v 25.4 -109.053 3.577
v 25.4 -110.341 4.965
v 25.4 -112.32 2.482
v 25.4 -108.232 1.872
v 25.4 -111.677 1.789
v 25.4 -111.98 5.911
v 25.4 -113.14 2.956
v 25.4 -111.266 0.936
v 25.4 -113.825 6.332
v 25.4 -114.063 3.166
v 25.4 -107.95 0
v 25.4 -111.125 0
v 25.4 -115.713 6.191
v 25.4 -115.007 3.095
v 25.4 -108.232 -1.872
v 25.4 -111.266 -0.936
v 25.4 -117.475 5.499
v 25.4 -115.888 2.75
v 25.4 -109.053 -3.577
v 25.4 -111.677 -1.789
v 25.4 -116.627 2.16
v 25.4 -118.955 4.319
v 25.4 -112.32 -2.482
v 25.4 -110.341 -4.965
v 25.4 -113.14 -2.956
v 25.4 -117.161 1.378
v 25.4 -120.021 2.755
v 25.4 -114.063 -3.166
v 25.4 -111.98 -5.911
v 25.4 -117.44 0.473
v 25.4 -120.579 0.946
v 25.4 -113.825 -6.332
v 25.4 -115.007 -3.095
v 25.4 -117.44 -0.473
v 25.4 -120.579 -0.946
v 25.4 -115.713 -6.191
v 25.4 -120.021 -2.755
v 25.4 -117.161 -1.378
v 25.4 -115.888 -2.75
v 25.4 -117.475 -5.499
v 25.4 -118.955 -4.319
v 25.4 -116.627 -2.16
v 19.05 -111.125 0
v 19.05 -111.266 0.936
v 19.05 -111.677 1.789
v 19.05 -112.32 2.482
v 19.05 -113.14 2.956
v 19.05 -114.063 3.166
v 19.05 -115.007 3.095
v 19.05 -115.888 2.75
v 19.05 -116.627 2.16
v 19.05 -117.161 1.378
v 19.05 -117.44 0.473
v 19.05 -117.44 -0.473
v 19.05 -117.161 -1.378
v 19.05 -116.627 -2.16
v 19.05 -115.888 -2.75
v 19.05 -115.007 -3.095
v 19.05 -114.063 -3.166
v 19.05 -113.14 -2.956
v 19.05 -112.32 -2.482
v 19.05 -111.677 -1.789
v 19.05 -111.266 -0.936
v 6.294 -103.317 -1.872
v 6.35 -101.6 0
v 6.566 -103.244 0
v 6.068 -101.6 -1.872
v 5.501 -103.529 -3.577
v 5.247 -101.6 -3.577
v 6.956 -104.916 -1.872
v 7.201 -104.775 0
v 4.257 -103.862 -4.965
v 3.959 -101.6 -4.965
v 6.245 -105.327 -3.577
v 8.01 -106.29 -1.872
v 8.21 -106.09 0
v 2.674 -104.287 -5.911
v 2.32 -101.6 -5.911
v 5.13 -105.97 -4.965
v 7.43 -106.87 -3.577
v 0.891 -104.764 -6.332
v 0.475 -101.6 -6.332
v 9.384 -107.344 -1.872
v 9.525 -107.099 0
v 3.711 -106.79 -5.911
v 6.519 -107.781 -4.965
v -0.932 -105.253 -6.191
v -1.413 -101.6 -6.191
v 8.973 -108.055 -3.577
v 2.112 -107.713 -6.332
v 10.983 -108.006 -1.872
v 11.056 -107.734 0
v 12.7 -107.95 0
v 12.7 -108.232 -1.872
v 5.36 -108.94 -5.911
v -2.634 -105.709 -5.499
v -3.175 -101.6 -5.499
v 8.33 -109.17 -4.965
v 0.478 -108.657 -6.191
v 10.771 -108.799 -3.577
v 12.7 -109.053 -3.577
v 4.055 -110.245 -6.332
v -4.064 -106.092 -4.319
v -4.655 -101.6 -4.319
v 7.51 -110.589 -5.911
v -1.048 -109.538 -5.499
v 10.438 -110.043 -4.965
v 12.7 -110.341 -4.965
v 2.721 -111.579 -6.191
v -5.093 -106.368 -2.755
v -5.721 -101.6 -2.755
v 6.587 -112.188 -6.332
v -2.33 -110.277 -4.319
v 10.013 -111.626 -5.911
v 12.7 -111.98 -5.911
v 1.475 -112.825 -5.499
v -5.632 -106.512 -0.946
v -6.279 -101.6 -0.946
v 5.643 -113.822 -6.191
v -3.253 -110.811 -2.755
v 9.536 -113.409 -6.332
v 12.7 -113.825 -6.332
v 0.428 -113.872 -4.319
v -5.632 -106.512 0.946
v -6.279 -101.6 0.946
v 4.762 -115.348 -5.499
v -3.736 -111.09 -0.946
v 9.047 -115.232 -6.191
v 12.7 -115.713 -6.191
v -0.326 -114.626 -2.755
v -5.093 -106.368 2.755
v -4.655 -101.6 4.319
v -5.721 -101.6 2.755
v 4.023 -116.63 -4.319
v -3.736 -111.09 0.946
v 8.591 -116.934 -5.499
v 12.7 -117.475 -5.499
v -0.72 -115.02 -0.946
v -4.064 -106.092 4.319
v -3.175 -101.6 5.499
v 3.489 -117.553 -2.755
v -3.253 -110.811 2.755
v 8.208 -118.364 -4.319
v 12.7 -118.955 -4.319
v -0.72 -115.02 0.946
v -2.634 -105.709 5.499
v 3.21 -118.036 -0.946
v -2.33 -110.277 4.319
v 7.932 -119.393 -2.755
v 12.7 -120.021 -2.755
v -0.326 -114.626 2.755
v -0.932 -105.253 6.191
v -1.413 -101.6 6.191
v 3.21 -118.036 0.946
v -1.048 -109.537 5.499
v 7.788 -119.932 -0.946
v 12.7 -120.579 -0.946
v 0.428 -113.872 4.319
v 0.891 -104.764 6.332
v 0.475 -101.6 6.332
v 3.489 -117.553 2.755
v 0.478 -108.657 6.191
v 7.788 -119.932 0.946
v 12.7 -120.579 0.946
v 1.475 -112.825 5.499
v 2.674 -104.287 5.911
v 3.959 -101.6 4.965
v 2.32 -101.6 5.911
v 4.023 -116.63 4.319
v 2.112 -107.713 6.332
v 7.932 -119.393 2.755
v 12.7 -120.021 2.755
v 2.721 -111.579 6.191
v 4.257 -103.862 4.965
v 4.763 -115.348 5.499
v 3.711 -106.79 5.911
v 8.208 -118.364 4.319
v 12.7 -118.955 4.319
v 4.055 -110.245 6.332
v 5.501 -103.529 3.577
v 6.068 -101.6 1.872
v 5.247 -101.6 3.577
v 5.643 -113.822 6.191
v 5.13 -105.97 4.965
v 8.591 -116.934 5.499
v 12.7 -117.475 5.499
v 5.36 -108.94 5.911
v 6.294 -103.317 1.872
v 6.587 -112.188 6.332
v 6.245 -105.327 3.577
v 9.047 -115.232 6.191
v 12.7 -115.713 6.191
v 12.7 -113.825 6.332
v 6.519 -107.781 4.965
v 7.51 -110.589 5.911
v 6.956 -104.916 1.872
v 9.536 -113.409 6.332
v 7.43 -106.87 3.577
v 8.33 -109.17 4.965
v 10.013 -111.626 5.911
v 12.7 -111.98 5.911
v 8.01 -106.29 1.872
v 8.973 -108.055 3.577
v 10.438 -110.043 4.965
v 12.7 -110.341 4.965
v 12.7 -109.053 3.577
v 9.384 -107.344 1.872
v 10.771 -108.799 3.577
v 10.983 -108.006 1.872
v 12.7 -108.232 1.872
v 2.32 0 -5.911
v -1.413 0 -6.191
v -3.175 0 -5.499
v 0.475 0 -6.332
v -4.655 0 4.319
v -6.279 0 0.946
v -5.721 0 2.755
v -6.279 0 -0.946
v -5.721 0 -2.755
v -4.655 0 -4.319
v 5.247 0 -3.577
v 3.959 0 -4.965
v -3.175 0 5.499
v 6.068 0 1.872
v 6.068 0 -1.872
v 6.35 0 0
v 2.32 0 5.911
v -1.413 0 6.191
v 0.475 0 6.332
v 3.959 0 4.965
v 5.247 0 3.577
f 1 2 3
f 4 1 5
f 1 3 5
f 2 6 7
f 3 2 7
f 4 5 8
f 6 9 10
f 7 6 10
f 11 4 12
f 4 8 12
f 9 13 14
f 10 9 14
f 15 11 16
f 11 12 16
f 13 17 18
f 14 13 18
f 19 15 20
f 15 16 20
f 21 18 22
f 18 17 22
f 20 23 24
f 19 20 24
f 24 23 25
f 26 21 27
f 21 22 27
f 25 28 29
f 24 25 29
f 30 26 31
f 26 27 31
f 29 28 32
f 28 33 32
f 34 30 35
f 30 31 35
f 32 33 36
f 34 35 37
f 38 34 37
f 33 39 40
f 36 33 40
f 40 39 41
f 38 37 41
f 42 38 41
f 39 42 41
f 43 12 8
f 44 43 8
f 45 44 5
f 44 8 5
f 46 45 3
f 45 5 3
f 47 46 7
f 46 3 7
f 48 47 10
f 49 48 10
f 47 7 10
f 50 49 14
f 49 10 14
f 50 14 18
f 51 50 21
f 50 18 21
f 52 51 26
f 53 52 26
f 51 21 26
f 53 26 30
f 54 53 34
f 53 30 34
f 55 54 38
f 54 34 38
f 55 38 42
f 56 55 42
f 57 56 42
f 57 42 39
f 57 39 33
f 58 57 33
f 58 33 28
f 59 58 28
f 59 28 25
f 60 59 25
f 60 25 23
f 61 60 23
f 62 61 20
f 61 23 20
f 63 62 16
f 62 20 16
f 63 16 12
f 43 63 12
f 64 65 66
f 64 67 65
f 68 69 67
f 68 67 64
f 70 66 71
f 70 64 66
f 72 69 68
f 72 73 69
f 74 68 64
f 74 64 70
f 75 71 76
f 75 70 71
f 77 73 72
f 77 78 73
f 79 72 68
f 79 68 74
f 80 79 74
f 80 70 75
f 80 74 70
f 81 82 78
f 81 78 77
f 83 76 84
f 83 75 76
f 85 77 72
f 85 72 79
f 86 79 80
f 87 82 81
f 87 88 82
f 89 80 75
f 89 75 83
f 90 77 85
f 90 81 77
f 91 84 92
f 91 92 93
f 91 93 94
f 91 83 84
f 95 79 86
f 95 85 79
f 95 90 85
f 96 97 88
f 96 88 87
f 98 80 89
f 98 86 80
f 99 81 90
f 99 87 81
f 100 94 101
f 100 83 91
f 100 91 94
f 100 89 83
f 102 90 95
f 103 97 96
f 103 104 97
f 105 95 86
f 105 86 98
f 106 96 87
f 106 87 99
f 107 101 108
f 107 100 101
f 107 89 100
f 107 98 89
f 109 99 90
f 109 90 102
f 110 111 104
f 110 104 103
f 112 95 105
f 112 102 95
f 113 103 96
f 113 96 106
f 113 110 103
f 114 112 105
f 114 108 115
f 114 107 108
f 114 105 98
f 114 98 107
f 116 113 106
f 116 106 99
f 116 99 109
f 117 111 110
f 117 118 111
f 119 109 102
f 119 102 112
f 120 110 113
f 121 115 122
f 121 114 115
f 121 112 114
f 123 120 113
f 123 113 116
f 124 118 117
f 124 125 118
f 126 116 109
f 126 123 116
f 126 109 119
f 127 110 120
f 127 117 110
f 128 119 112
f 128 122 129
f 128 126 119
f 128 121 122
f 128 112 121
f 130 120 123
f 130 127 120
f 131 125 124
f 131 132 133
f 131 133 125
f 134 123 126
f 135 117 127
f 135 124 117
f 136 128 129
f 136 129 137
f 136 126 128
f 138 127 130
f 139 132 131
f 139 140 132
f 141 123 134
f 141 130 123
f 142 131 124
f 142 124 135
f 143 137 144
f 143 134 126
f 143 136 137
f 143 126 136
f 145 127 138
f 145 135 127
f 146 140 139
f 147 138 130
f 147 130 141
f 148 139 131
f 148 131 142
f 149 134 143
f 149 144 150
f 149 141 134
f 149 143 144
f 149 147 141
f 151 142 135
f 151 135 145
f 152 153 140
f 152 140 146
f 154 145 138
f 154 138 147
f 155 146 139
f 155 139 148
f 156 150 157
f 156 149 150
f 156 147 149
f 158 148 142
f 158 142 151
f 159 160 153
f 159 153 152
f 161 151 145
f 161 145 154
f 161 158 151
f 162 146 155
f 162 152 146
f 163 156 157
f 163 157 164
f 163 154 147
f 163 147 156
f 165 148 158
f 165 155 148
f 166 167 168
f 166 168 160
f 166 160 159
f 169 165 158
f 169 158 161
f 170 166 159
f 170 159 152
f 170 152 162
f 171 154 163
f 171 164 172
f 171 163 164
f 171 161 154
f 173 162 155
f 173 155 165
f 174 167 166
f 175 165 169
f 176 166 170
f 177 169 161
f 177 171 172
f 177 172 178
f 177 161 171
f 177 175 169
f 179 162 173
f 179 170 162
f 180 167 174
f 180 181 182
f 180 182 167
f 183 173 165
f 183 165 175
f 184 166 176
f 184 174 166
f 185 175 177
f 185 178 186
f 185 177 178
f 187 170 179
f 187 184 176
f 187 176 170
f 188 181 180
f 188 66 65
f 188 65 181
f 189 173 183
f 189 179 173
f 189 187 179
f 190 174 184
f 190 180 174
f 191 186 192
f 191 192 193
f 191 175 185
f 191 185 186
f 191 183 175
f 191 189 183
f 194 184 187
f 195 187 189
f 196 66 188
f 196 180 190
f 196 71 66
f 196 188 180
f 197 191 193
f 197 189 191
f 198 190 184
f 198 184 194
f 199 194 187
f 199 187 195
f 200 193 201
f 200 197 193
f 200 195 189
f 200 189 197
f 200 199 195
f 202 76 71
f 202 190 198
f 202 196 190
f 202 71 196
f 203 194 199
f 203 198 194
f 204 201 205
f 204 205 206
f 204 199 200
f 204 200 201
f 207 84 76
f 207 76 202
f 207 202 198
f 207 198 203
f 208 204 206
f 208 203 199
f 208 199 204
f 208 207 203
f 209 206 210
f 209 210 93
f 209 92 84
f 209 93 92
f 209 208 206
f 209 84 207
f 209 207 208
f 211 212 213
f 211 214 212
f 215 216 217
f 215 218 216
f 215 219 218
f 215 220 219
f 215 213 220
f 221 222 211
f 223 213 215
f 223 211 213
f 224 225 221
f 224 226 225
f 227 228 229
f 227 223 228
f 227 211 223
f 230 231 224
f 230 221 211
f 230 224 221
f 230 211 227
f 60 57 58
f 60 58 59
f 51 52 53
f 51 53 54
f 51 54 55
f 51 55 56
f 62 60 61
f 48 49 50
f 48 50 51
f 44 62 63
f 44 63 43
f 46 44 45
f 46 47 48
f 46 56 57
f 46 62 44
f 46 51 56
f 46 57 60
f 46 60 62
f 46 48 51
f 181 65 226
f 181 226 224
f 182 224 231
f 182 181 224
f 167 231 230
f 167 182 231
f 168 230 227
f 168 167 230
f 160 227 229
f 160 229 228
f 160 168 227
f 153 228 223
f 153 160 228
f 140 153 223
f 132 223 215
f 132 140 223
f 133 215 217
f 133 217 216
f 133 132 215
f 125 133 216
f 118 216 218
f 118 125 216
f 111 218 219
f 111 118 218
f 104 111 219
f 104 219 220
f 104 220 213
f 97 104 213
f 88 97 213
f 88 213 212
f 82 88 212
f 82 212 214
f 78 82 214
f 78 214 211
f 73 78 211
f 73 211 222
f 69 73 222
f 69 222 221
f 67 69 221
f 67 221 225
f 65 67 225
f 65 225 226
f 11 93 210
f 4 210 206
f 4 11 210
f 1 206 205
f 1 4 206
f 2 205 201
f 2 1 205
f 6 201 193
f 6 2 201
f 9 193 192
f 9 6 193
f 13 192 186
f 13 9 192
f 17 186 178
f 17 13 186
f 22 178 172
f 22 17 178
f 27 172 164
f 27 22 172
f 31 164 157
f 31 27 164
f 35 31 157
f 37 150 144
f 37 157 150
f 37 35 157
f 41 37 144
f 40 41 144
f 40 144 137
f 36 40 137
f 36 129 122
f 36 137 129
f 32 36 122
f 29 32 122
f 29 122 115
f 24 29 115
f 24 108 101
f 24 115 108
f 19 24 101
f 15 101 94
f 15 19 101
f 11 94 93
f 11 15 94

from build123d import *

# Parameters (mm, degrees)
SKETCH1_R          = 6.35
SKETCH3_R          = 3.175
CUT_EXTRUDE1_DEPTH = 6.35


with BuildPart() as part:
    # Sweep1: sweep along a path in Sketch2
    with BuildLine(Plane.XY) as sweep1_path:
        Line((0, 0), (0, -101.6))
        ThreePointArc((0, -101.6), (3.719743879, -110.580256121), (12.7, -114.3))
        Line((12.7, -114.3), (25.4, -114.3))
    # Sketch1 → Sweep1 (sweep)
    with BuildSketch(Plane(origin=(0, 0, 0), x_dir=(1, 0, 0), z_dir=(0, 1, 0))):
        Circle(SKETCH1_R)
    sweep(path=sweep1_path.line)

    # Sketch3 → Cut-Extrude1 (cut)
    with BuildSketch(Plane(origin=(25.4, 0, 0), x_dir=(0, 0, -1), z_dir=(1, 0, 0))):
        with Locations(Location((0, -114.3, 0), (0, 0, 90))):
            Circle(SKETCH3_R)
    extrude(amount=-CUT_EXTRUDE1_DEPTH, mode=Mode.SUBTRACT)


solid = part.part
